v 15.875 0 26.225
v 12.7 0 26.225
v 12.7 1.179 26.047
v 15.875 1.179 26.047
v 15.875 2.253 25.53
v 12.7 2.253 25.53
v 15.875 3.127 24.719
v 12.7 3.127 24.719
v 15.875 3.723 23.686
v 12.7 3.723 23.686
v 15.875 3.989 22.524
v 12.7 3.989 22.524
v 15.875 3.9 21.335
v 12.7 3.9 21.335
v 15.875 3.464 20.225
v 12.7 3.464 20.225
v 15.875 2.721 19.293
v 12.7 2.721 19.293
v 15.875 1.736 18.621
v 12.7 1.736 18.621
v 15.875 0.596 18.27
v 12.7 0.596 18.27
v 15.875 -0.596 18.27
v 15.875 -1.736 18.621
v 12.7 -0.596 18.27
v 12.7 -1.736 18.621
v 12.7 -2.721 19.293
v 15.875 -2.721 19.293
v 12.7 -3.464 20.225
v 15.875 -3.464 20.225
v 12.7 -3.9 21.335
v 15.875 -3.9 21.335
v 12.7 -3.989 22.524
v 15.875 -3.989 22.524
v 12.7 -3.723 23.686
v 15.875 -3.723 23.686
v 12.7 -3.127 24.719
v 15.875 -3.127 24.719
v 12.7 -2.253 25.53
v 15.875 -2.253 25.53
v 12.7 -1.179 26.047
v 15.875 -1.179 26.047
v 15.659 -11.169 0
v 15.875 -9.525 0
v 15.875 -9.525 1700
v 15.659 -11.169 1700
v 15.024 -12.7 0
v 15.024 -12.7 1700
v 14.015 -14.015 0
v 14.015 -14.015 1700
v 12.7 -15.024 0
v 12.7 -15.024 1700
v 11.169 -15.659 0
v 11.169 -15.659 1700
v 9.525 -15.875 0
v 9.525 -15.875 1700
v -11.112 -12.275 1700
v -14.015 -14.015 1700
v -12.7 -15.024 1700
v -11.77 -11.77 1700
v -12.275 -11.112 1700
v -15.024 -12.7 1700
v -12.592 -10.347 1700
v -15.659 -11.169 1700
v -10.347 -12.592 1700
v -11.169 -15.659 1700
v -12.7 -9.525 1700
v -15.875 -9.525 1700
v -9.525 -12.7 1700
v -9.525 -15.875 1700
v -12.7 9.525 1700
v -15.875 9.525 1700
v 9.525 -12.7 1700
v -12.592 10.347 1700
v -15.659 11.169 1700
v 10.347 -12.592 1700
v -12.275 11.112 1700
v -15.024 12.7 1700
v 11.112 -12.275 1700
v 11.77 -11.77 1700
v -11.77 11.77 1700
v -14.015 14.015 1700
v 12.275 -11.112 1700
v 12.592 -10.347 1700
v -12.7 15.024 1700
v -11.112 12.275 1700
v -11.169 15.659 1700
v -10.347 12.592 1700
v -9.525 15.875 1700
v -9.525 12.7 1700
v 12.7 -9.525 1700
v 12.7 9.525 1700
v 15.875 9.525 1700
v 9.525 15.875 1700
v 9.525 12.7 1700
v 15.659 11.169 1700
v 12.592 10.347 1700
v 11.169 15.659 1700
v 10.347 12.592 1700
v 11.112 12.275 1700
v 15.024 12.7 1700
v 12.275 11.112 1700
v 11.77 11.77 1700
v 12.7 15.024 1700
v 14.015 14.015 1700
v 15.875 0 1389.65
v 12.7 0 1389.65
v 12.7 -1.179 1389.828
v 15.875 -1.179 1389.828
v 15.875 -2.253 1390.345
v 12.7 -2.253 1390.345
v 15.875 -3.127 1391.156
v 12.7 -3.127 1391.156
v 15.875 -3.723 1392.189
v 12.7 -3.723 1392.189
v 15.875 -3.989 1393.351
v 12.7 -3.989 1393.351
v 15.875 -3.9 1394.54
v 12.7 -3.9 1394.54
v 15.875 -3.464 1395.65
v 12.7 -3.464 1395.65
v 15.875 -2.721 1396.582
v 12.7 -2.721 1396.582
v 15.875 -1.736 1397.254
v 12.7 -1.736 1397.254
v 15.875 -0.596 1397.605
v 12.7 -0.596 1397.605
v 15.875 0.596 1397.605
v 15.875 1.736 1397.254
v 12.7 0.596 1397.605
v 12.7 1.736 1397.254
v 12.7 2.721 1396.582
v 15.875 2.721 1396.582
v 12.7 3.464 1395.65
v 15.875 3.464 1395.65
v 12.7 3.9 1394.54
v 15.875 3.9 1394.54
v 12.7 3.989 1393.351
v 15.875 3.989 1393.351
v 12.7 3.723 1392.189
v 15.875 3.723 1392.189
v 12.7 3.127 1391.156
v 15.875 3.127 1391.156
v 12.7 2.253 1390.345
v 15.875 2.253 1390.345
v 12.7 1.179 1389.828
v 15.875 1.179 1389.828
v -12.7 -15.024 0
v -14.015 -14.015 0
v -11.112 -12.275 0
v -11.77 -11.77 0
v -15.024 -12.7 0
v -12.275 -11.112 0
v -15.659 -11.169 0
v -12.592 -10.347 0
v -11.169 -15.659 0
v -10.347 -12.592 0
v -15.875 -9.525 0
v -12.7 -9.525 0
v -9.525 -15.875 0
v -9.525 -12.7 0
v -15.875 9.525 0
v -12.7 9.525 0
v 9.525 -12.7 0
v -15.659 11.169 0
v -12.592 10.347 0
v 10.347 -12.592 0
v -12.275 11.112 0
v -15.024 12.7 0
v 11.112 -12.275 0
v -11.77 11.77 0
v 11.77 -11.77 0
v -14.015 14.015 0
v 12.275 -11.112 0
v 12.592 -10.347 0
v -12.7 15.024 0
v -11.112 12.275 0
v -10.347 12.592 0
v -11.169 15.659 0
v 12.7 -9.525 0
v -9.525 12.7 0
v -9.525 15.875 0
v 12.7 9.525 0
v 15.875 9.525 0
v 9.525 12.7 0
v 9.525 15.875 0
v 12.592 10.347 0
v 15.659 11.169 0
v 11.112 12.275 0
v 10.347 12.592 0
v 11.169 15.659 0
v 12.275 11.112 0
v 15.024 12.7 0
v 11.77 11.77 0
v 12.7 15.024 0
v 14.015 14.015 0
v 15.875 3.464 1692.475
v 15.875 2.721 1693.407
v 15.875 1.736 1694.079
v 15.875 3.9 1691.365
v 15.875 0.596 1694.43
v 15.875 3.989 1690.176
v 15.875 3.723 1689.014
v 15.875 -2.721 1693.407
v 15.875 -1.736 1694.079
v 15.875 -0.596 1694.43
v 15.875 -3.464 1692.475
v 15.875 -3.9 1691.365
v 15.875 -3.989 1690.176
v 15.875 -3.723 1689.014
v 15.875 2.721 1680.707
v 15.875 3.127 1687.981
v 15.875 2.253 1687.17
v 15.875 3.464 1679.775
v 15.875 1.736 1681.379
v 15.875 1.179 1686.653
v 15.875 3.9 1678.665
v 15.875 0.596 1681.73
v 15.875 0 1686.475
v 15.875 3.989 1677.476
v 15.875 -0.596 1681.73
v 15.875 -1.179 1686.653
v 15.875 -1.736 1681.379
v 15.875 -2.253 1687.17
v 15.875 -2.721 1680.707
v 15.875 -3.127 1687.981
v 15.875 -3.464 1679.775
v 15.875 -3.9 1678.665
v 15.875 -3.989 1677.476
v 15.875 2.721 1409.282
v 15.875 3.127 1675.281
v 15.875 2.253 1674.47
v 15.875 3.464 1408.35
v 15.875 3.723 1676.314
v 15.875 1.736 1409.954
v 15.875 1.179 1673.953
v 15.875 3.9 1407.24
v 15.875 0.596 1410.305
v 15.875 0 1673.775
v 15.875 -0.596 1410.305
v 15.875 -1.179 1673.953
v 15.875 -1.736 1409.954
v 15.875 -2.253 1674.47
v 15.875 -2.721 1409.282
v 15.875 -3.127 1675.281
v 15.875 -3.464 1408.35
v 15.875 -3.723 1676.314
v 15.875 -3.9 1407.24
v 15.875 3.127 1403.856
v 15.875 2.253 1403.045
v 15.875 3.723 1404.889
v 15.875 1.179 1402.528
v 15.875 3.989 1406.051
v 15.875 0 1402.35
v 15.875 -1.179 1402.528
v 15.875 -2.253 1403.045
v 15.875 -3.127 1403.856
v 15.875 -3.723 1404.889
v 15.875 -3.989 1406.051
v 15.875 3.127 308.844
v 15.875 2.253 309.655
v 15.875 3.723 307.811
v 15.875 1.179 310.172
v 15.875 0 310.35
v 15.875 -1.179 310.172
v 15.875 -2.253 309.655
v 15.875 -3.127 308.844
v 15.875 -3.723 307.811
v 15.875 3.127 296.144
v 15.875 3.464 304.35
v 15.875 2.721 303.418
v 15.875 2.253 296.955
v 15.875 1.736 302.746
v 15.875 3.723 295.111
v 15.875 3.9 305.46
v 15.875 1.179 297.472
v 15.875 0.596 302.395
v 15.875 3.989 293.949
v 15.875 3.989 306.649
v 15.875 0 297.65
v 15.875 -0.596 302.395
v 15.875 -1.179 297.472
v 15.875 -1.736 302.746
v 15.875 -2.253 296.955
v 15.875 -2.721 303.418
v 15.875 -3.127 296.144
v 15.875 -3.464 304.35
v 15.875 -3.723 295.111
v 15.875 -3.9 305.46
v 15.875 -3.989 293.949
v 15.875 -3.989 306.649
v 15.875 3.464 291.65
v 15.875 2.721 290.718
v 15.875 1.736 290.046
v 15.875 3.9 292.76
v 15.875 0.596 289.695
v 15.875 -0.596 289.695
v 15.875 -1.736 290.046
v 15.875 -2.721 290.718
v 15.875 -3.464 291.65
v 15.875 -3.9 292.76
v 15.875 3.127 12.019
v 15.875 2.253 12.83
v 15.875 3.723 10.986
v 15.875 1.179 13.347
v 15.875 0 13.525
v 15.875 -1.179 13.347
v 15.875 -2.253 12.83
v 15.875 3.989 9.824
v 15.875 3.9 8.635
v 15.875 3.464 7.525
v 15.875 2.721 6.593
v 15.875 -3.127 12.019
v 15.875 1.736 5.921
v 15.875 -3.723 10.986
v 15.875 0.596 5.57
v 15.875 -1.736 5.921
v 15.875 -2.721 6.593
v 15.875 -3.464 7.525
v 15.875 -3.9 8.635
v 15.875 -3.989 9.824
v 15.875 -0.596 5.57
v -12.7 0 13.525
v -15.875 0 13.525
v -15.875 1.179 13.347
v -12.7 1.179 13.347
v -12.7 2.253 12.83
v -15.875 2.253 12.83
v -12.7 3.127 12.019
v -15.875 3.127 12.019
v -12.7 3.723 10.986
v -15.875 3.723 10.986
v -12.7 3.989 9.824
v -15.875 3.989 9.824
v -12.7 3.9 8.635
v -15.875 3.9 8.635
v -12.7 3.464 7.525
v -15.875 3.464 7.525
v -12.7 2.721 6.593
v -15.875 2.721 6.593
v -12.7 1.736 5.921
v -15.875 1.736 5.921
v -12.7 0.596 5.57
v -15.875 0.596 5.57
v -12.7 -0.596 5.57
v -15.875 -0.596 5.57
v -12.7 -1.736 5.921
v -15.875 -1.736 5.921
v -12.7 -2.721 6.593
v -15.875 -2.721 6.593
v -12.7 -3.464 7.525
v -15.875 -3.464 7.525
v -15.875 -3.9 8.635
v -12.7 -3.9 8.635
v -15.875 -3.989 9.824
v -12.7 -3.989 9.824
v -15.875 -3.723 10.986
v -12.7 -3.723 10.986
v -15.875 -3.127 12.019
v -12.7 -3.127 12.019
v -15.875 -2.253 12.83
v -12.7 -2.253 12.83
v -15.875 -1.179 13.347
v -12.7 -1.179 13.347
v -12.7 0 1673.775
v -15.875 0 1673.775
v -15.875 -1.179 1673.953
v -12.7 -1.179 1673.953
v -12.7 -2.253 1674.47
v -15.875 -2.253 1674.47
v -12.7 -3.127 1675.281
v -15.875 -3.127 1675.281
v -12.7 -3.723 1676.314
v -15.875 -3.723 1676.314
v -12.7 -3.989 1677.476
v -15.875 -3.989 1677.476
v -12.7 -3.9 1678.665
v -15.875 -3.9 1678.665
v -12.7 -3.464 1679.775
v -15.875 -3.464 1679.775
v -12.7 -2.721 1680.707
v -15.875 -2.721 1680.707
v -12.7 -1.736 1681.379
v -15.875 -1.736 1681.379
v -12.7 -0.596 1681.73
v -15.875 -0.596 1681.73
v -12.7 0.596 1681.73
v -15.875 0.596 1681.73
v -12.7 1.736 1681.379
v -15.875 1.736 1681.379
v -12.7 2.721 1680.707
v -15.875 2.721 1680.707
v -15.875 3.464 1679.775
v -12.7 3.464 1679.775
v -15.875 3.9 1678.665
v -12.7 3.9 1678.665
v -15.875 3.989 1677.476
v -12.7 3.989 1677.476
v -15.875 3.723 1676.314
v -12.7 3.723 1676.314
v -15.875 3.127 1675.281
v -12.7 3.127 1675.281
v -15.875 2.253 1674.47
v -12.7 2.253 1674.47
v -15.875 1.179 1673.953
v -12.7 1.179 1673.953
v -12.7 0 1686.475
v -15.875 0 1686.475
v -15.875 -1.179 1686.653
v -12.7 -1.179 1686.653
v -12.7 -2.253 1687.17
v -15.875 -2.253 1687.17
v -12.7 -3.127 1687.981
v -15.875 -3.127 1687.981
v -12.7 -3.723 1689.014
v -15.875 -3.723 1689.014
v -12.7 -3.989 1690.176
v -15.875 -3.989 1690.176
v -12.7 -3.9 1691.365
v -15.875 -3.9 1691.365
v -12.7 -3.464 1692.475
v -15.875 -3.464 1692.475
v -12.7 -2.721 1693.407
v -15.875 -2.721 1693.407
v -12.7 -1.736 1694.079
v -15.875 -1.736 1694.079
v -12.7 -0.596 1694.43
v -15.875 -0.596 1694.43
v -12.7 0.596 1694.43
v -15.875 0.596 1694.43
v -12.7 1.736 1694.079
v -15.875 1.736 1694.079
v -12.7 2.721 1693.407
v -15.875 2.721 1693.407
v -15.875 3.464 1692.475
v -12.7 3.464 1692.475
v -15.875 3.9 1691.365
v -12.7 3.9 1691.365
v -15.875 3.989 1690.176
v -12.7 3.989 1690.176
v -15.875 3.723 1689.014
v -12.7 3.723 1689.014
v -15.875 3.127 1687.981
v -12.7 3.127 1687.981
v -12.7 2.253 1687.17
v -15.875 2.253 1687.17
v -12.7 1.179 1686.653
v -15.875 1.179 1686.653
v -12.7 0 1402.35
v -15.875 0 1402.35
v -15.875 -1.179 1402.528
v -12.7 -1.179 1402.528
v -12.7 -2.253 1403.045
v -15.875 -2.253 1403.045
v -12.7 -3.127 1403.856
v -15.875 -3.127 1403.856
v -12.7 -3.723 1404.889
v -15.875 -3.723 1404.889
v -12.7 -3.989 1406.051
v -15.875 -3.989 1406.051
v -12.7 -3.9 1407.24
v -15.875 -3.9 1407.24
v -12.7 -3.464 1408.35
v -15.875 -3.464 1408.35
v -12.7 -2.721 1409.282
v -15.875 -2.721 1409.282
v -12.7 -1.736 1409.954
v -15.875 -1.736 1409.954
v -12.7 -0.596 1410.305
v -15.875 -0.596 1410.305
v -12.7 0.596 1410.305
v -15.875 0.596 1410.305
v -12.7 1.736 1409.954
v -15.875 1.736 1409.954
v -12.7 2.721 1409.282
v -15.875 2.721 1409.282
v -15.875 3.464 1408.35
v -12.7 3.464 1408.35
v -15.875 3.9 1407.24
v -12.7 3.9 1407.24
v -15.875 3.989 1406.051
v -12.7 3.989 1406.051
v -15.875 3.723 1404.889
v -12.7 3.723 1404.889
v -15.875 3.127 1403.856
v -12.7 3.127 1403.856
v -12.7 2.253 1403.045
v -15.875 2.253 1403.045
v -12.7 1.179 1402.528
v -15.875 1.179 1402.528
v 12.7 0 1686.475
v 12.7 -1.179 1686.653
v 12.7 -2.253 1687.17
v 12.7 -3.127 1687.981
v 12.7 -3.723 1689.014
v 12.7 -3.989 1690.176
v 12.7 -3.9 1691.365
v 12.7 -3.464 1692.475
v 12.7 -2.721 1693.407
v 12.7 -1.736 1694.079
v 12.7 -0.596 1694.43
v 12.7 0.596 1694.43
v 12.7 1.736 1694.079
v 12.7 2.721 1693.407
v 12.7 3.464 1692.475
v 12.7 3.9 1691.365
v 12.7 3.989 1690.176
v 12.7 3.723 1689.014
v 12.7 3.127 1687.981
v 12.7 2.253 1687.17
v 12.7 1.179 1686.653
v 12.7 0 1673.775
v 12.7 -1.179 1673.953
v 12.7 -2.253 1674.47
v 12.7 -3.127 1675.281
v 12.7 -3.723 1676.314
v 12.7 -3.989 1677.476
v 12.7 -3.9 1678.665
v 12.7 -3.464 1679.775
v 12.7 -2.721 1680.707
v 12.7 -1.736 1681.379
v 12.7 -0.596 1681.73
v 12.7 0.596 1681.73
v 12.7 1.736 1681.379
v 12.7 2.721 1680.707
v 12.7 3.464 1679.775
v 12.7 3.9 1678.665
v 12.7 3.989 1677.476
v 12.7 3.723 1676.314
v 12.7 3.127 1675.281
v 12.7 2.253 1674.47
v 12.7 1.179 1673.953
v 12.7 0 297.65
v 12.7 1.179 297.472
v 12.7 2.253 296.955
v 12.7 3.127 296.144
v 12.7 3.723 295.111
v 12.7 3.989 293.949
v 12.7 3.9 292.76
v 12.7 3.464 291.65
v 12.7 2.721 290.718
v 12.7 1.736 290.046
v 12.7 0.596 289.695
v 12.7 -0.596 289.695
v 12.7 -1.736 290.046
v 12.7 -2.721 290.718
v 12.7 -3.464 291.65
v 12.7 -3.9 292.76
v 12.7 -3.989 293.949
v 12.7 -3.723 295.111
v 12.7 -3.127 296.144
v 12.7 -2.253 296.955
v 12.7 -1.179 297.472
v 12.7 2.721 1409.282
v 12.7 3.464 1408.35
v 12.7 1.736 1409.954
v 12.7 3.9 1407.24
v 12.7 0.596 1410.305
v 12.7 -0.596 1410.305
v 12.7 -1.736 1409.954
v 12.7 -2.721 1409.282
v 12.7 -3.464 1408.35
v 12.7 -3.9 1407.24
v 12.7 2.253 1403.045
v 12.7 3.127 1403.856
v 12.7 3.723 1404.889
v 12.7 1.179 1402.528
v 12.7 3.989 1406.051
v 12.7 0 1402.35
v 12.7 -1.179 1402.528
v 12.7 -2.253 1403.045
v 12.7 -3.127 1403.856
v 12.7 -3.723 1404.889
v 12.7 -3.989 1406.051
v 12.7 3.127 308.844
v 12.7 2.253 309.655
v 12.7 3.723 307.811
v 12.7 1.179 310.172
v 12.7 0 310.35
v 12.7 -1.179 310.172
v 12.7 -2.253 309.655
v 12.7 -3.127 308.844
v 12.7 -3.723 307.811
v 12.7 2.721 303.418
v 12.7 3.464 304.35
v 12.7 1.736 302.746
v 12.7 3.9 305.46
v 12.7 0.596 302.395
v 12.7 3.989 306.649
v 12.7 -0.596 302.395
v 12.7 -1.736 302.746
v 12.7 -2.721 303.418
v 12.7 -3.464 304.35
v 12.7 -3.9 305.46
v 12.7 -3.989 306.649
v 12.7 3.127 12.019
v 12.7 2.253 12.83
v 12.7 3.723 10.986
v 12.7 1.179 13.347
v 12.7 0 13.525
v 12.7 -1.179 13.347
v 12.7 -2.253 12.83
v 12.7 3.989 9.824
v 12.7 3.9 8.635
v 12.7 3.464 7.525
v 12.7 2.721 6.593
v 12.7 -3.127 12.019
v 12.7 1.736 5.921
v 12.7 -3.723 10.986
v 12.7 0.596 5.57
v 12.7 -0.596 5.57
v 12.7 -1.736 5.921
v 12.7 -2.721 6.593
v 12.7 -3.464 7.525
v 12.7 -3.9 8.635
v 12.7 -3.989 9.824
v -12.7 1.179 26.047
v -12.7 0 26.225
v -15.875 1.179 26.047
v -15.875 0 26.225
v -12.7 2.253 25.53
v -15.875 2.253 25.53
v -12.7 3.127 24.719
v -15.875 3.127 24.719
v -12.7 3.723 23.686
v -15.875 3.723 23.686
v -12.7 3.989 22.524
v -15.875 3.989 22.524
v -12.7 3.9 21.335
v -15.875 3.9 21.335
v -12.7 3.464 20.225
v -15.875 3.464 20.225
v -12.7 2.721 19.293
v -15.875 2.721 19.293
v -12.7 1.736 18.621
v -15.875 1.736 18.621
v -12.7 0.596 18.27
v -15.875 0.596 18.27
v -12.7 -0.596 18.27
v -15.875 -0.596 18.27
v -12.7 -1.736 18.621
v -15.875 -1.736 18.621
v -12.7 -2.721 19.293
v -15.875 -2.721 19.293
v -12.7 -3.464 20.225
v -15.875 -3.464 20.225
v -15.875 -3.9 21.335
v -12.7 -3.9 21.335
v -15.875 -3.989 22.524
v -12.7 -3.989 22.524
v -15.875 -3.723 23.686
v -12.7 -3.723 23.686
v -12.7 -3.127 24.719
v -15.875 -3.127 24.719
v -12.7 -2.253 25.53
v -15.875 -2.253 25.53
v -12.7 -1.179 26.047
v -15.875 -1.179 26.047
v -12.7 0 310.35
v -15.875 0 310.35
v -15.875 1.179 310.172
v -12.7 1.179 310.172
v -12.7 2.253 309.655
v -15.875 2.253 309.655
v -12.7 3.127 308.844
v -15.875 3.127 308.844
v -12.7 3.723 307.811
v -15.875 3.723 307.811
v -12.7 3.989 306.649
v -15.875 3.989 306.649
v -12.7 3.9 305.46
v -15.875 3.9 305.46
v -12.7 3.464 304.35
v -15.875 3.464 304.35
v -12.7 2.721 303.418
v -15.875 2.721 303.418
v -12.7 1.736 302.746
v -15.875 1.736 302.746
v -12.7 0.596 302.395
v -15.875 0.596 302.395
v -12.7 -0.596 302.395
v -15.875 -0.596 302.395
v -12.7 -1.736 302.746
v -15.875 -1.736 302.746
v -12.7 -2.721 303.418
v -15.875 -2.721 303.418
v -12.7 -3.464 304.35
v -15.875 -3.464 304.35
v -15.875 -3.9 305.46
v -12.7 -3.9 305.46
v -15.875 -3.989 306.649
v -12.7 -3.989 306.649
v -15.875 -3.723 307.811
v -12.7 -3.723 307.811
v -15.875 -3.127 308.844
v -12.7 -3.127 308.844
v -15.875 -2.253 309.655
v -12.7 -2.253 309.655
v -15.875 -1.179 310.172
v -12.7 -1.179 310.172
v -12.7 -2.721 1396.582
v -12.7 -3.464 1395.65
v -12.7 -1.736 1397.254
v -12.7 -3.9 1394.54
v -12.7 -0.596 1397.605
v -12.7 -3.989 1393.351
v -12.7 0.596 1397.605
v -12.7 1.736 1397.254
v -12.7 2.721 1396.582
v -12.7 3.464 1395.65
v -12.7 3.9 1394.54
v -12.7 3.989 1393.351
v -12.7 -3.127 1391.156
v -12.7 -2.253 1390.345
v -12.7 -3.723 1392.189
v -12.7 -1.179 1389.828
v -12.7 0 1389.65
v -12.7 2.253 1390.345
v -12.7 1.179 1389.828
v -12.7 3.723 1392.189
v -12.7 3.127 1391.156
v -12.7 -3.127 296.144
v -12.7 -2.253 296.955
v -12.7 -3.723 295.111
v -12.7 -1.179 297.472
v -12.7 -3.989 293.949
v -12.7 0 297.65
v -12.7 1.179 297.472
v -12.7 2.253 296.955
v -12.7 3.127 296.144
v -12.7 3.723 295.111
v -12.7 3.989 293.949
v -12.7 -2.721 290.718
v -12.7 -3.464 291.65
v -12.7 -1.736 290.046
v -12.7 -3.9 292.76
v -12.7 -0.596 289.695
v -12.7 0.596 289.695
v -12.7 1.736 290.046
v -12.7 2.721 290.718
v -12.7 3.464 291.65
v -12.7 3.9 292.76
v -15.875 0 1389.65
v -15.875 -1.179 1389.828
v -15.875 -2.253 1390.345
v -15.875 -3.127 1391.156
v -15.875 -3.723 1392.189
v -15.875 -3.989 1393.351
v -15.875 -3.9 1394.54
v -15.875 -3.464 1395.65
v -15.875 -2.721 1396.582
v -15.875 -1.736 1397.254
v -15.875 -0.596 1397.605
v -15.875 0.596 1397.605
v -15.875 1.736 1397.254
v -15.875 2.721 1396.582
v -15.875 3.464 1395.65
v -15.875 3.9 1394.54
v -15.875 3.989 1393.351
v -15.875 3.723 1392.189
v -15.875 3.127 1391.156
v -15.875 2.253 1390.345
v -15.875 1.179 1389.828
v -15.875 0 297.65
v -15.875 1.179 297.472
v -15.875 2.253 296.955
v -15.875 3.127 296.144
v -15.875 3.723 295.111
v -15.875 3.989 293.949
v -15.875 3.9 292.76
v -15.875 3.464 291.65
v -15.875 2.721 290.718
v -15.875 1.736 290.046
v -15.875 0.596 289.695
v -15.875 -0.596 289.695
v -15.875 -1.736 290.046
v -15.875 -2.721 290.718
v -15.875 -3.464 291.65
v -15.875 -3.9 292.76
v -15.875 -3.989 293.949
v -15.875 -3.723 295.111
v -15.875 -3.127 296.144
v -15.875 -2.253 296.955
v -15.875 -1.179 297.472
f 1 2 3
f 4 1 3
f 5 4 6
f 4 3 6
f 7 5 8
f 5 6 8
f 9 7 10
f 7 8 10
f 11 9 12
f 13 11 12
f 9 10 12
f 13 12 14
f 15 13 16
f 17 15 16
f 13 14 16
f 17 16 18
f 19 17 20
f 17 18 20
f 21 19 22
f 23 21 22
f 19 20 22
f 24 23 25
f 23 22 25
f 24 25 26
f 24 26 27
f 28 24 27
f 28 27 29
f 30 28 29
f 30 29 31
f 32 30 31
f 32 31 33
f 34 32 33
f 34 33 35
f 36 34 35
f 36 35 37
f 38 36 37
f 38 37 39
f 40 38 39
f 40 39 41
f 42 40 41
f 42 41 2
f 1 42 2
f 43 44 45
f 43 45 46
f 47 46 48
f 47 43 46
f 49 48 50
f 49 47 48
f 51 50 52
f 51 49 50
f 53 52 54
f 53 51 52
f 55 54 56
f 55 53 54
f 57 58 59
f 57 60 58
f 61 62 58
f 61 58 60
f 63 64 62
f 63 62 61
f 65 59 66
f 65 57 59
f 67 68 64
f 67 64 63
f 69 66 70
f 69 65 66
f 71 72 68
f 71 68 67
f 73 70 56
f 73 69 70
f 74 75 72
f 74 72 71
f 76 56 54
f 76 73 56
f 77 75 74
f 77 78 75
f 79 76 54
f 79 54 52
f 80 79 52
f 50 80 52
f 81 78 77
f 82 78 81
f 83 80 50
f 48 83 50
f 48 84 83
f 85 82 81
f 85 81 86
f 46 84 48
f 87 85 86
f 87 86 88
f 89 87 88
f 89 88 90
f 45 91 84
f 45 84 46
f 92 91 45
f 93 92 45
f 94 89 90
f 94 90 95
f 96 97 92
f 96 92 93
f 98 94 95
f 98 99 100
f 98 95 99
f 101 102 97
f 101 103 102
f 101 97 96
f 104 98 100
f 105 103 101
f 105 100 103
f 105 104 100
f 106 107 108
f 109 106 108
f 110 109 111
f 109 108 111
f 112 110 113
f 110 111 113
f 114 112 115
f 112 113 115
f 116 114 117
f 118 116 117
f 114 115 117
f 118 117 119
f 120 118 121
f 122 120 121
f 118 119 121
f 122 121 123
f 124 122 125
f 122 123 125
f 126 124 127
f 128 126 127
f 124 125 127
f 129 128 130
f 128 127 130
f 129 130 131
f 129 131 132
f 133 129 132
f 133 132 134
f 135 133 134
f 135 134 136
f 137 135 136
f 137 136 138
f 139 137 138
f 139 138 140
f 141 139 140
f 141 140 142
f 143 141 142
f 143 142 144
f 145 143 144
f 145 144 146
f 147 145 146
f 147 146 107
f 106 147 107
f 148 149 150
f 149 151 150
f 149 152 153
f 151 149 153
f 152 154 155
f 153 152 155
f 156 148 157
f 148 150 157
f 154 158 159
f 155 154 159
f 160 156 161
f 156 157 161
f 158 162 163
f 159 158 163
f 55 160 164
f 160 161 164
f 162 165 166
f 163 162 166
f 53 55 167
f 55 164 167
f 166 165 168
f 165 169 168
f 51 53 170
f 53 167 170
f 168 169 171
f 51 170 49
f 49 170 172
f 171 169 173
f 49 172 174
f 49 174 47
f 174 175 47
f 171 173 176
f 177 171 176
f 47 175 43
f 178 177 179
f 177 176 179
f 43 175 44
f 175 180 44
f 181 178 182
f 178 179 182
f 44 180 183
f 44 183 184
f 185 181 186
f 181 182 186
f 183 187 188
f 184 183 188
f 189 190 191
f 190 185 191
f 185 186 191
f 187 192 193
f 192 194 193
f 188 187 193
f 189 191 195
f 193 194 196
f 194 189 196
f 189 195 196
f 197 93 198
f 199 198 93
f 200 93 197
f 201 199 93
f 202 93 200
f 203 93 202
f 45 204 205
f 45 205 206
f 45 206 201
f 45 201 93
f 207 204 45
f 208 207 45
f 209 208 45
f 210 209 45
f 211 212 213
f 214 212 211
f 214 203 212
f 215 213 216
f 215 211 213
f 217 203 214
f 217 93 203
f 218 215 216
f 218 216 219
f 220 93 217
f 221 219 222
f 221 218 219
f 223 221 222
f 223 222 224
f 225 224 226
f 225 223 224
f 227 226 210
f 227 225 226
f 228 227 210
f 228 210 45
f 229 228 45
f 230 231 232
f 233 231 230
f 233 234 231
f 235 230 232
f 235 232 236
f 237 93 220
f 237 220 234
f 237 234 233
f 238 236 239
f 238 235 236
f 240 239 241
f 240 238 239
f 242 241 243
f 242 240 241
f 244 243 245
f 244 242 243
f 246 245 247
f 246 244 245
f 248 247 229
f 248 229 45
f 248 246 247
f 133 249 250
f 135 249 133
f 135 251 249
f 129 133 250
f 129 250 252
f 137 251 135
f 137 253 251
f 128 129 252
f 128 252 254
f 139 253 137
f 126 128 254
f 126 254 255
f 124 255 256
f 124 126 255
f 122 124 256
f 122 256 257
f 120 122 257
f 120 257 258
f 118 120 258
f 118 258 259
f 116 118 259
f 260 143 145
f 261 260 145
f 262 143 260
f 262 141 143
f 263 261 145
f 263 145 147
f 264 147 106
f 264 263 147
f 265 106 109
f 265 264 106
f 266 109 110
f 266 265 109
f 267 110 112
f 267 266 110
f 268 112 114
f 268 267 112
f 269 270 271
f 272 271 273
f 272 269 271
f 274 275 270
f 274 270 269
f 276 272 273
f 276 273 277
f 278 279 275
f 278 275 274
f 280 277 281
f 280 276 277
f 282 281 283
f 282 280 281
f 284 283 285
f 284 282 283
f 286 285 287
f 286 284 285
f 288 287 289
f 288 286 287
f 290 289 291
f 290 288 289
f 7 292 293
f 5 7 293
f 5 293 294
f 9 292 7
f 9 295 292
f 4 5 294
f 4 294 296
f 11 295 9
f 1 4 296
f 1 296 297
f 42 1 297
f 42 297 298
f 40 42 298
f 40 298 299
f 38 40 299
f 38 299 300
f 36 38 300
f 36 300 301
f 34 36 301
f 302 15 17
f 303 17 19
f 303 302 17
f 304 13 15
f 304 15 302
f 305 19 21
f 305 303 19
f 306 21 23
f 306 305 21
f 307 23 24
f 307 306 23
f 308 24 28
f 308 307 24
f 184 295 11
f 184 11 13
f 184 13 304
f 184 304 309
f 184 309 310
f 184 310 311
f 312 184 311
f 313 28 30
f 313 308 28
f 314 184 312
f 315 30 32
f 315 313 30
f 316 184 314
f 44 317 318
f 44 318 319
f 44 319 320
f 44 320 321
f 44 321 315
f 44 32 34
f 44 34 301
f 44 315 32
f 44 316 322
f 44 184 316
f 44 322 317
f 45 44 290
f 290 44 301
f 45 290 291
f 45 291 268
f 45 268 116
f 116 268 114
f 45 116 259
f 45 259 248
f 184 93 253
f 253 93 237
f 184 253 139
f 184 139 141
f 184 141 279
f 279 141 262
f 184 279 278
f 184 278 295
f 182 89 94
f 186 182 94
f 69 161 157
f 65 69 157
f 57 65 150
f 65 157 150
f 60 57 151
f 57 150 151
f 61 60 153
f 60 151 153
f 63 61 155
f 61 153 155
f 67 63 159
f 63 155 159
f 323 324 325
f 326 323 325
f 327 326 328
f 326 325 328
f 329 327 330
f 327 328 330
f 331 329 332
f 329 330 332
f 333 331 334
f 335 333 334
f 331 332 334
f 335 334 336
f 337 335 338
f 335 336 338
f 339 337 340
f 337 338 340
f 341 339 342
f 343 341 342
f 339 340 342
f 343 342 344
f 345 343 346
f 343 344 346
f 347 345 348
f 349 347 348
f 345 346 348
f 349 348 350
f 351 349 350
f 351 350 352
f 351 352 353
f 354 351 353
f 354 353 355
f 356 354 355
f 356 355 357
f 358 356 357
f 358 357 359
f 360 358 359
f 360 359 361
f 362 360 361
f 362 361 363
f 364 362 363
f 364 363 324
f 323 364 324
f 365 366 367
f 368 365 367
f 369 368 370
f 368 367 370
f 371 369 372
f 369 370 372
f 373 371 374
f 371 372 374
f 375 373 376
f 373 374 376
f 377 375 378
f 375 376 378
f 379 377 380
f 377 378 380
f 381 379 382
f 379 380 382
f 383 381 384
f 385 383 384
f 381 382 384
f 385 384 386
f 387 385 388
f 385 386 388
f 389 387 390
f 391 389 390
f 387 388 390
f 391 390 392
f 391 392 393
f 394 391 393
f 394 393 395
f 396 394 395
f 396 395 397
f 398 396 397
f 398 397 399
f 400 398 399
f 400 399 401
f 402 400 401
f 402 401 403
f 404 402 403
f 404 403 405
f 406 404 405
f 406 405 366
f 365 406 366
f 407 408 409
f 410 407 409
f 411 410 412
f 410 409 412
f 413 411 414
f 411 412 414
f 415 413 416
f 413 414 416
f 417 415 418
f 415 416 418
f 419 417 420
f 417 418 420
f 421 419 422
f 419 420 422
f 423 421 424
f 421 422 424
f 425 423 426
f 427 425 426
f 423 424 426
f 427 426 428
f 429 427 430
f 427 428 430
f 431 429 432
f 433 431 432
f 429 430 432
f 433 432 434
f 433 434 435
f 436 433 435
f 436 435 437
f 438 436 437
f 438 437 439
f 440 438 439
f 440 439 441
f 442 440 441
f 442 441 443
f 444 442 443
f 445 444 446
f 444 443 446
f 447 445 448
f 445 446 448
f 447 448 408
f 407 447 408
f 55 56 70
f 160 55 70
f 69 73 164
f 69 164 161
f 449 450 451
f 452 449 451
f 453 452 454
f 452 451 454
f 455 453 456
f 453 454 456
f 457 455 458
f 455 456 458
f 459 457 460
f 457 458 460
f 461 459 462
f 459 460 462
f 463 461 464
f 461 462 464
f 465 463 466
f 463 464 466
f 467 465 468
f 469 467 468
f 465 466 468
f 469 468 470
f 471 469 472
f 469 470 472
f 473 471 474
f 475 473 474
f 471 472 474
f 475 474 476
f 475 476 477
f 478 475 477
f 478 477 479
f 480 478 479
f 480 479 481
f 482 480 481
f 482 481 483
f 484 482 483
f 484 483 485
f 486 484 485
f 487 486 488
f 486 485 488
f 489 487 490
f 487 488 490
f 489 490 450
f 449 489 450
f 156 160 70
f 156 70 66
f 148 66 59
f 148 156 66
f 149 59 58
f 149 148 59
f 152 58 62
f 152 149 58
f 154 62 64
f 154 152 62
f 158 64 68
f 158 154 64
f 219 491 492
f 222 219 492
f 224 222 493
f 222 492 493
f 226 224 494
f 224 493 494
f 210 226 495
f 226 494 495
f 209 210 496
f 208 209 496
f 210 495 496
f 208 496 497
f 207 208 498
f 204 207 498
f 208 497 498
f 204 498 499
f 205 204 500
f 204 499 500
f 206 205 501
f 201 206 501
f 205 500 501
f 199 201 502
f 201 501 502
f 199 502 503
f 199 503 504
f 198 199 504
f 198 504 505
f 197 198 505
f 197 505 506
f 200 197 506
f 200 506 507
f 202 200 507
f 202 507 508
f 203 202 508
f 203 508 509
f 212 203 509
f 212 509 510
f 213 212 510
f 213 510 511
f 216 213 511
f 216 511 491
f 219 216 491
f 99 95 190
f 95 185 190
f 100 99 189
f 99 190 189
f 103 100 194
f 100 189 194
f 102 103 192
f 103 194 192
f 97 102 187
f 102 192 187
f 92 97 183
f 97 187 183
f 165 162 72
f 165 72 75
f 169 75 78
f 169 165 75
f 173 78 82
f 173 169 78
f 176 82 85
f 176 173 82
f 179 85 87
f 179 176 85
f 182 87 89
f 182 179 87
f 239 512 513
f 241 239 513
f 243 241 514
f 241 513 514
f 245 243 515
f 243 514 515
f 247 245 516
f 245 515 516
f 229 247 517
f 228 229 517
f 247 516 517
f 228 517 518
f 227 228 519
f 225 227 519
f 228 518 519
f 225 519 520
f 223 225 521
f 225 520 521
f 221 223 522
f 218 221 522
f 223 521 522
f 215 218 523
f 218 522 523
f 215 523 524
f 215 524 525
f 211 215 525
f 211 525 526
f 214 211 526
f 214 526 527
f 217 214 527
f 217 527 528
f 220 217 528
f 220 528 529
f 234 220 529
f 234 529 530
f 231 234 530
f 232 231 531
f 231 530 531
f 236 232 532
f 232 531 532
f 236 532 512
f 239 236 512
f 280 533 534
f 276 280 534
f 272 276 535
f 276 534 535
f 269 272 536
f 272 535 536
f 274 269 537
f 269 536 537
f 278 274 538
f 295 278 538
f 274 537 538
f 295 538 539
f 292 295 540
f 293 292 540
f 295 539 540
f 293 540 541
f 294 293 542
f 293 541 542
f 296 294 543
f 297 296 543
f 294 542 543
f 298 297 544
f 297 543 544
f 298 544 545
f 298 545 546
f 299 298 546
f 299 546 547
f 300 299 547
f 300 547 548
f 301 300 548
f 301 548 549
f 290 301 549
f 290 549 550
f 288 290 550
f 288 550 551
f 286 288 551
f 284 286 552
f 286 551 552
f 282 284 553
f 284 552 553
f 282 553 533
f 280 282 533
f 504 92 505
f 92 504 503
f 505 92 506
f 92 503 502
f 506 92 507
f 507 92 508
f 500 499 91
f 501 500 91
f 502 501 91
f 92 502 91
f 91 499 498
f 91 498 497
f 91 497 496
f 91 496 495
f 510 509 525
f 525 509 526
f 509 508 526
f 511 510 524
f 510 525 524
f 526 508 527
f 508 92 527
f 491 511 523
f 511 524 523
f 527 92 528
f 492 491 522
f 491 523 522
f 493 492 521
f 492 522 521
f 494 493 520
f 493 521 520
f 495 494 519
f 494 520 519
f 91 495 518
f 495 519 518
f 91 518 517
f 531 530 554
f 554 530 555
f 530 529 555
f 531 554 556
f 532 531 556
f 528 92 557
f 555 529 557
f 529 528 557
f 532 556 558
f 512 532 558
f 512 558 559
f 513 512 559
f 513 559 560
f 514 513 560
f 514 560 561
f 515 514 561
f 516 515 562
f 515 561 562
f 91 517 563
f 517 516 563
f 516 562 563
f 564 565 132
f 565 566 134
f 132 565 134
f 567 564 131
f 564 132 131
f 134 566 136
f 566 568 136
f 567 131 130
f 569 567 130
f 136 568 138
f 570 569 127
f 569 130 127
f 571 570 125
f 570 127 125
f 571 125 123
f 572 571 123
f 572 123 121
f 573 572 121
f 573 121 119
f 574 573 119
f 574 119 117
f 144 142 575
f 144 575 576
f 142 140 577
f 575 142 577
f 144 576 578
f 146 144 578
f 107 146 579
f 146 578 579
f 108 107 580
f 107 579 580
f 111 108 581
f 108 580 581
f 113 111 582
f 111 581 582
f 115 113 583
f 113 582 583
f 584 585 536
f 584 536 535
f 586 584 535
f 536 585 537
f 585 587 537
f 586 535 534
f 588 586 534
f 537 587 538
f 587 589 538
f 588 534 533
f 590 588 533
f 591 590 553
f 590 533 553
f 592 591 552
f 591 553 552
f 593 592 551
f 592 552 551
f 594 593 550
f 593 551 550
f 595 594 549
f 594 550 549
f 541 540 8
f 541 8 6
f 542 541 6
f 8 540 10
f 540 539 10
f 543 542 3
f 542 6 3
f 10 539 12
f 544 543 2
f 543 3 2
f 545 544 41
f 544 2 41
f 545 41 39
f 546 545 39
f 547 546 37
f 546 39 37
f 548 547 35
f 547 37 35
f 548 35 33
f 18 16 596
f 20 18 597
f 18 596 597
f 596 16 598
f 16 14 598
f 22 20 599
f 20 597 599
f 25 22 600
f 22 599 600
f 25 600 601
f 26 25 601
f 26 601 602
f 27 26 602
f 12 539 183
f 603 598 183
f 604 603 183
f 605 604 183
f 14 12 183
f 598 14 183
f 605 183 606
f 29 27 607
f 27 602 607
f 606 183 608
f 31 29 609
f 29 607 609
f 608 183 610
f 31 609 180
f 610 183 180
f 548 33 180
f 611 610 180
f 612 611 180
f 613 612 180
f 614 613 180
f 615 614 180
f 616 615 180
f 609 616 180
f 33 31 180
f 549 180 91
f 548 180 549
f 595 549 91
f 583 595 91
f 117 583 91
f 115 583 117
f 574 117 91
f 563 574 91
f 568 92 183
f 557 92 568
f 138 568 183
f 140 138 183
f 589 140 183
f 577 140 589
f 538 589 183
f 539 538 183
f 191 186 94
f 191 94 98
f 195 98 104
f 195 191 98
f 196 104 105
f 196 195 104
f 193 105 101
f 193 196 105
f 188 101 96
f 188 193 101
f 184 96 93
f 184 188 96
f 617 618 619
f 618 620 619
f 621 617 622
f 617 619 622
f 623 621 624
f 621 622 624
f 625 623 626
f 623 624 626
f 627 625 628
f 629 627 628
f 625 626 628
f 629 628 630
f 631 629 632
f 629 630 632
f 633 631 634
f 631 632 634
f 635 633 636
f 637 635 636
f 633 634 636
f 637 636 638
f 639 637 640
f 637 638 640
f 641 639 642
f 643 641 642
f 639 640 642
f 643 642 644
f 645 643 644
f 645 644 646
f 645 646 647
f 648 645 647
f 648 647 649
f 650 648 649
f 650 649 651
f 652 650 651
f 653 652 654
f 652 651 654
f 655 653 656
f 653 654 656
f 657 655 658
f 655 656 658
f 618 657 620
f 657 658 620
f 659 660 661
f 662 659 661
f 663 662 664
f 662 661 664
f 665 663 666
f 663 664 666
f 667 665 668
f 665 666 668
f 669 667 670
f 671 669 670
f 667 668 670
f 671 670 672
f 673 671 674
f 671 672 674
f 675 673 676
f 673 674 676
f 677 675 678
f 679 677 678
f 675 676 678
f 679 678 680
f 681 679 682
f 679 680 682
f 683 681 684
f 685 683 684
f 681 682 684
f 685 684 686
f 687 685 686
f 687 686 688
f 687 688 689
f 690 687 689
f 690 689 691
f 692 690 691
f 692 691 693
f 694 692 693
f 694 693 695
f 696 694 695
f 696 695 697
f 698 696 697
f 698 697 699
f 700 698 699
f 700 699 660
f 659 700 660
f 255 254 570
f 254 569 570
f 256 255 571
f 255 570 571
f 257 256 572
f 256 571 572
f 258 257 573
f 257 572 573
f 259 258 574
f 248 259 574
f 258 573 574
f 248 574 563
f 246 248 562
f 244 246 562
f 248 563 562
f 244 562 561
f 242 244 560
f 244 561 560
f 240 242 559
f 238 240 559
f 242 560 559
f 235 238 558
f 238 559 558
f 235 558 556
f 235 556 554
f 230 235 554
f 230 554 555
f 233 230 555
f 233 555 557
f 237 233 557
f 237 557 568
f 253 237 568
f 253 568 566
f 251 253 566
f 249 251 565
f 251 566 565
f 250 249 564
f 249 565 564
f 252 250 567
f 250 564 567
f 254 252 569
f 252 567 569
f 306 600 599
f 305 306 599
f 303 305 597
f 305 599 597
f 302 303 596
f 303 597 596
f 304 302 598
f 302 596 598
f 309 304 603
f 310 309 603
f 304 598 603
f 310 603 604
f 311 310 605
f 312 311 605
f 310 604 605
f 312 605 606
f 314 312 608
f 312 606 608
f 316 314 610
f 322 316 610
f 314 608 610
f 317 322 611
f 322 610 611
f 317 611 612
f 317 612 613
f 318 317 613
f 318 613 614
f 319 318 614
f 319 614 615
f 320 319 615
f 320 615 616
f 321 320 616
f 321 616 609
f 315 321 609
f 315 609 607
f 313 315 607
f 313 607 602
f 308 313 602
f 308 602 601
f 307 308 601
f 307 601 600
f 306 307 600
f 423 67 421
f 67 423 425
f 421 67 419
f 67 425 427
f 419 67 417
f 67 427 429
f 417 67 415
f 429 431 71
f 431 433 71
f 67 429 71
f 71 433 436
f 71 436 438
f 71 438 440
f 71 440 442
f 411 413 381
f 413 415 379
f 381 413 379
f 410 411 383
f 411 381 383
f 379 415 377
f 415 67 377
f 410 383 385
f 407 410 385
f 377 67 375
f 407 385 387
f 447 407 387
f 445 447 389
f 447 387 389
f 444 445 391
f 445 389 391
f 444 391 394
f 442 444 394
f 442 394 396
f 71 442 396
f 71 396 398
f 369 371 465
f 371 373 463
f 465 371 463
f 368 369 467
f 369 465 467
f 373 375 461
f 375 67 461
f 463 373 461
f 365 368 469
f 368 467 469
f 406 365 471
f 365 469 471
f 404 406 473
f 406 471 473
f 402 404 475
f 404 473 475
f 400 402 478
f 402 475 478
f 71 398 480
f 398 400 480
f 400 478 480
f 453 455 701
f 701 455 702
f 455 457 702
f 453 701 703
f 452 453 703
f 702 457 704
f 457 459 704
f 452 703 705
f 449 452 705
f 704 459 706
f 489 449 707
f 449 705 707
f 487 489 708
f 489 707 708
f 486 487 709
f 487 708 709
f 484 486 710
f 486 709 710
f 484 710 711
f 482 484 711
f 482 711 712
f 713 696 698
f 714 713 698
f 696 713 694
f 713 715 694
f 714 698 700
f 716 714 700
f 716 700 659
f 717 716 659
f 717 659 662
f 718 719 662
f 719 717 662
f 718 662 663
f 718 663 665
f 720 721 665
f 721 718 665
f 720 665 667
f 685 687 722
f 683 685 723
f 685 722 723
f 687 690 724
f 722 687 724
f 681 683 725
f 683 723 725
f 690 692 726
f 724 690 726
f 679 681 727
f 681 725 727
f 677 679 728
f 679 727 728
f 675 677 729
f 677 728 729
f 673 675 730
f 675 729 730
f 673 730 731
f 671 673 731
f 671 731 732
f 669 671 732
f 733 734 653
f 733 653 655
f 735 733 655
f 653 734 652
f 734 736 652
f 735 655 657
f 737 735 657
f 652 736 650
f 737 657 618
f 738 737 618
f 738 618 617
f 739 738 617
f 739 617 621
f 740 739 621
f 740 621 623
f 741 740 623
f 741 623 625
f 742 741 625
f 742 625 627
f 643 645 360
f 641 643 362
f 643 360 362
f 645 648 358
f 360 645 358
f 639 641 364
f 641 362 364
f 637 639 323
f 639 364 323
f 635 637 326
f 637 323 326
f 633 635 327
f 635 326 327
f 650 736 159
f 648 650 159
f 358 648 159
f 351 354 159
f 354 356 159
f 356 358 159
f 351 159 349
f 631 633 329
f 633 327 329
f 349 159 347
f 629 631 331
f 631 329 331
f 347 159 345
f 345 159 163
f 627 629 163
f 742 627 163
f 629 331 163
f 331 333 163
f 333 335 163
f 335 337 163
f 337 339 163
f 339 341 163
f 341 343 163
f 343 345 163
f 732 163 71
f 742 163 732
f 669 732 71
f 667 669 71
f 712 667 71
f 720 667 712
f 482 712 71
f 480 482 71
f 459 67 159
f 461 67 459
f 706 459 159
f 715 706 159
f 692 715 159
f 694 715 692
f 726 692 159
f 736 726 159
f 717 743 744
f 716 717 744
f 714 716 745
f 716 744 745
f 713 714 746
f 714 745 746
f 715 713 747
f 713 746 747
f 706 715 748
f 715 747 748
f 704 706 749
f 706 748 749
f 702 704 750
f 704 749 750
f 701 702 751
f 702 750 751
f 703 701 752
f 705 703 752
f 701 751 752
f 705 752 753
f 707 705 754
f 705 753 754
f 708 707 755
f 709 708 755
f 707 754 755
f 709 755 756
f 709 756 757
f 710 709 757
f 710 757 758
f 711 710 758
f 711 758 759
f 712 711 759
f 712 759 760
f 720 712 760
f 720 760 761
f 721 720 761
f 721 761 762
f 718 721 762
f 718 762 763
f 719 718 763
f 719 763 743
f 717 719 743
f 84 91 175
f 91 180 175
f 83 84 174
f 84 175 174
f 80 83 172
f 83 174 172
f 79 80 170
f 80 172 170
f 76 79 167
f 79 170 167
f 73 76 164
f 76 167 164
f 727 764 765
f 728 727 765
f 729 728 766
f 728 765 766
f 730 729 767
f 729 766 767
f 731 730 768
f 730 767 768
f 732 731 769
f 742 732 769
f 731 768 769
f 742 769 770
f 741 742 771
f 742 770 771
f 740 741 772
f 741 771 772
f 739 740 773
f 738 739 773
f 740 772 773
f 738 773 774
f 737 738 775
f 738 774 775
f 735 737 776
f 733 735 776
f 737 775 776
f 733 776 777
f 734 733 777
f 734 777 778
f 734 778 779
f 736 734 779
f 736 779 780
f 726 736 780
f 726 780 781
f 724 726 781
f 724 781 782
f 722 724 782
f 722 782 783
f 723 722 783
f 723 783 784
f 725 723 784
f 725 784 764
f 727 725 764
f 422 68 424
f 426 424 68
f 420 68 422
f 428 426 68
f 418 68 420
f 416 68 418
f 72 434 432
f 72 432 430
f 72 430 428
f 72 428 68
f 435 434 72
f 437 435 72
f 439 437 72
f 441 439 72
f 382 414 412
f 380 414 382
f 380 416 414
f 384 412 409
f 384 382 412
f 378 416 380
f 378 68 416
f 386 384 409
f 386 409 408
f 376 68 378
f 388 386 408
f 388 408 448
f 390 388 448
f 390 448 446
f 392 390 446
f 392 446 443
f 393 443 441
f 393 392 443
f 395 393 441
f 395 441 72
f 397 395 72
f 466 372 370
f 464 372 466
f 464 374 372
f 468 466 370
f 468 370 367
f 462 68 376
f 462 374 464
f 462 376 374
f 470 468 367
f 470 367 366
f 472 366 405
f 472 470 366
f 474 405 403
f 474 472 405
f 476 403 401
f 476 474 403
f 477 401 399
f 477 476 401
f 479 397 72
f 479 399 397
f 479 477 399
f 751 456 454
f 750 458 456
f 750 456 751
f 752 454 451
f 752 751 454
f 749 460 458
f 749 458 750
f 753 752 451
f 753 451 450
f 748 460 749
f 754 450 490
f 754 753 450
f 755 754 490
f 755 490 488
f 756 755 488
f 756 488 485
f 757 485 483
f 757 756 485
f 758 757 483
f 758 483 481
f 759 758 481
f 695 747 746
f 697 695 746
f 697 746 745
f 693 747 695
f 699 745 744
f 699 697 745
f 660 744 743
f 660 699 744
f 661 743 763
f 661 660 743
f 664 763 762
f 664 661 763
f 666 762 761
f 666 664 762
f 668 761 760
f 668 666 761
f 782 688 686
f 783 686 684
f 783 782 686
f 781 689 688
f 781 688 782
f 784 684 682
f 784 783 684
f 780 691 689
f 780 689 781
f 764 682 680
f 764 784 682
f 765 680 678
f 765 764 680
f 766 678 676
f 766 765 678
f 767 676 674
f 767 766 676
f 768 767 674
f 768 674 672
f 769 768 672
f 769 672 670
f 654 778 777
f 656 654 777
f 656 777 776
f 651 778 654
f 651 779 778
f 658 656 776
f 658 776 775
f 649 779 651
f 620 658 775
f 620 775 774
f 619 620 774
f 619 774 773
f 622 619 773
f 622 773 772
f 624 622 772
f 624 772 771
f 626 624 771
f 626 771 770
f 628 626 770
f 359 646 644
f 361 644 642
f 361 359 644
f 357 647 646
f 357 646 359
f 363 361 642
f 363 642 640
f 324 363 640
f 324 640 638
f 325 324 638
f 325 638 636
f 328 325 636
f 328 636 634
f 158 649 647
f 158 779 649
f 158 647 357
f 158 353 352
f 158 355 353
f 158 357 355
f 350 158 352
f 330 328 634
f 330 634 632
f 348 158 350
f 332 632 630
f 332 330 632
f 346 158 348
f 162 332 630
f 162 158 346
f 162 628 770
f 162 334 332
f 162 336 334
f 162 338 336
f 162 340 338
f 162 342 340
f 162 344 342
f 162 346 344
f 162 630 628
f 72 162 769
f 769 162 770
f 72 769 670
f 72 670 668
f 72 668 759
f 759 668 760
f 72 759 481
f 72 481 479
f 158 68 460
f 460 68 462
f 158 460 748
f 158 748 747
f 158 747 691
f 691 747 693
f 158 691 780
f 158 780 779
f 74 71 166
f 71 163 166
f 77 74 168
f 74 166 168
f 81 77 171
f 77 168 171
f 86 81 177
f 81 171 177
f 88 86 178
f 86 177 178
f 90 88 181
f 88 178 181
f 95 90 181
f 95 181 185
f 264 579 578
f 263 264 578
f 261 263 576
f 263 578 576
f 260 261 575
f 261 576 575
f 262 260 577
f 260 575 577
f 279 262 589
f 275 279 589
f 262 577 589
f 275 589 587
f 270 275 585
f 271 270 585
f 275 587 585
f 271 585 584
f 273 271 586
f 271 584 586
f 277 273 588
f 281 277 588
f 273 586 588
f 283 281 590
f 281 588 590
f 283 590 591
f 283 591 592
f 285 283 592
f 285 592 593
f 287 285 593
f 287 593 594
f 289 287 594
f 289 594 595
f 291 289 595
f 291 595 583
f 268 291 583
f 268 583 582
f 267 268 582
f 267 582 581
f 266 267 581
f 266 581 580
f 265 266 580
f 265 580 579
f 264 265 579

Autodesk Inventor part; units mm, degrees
ref_plane "YZ Plane" through (0, 0, 0) normal (1, 0, 0) x (0, 1, 0)
ref_plane "Start Plane" through (0, 0, 0) normal (0, 0, 1) x (1, 0, 0)
ref_plane "End Plane" through (0, 0, 1700) normal (0, 0, 1) x (1, 0, 0)
sketch "Sketch" plane through (0, 0, 0) normal (0, 0, 1) x (1, 0, 0)
  line L0 (-15.875, -9.525) -> (-15.875, 9.525)
  line L1 (-9.525, 15.875) -> (9.525, 15.875)
  line L2 (15.875, 9.525) -> (15.875, -9.525)
  line L3 (9.525, -15.875) -> (-9.525, -15.875)
  arc A0 (-15.875, -9.525) -> (-9.525, -15.875) centre (-9.525, -9.525) ccw
  arc A1 (-9.525, 15.875) -> (-15.875, 9.525) centre (-9.525, 9.525) ccw
  arc A2 (15.875, 9.525) -> (9.525, 15.875) centre (9.525, 9.525) ccw
  arc A3 (9.525, -15.875) -> (15.875, -9.525) centre (9.525, -9.525) ccw
  arc A4 (-9.525, 12.7) -> (-12.7, 9.525) centre (-9.525, 9.525) ccw
  line L4 (-9.525, 12.7) -> (9.525, 12.7)
  arc A5 (12.7, 9.525) -> (9.525, 12.7) centre (9.525, 9.525) ccw
  line L5 (12.7, 9.525) -> (12.7, -9.525)
  arc A6 (9.525, -12.7) -> (12.7, -9.525) centre (9.525, -9.525) ccw
  line L6 (9.525, -12.7) -> (-9.525, -12.7)
  arc A7 (-12.7, -9.525) -> (-9.525, -12.7) centre (-9.525, -9.525) ccw
  line L7 (-12.7, -9.525) -> (-12.7, 9.525)
  line L8 (0, 24.0662) -> (0, -24.0662) construction
  line L9 (-24.0662, 0) -> (24.0662, 0) construction
  dimension "d10" = 31.75
  dimension "d11" = 31.75
  dimension "d12" = 3.175
  dimension "d15" = 15.875
  dimension "d16" = 15.875
  dimension "d17" = 6.35
extrude "Body" add sketch "Sketch" along normal up to surface (1700 mm away) from surface at 0
sketch "Sketch3" plane through (0, 0, 0) normal (0, 0, 1) x (1, 0, 0)
  line L0 (0, 0) -> (10, 0)
ref_plane "Work Plane3" through (0, 0, 0) normal (0, -1, 0) x (1, 0, 0)
sketch "Sketch5" plane through (-15.875, 9.525, 0) normal (-1, 0, 0) x (0, 0, 1)
  line L0 (309.525, 3.175) -> (290.475, 3.175) projected
  arc A0 (312.7, 0) -> (309.525, 3.175) centre (309.525, 0) ccw projected
  line L1 (312.7, -19.05) -> (312.7, 0) projected
  arc A1 (309.525, -22.225) -> (312.7, -19.05) centre (309.525, -19.05) ccw projected
  line L2 (290.475, -22.225) -> (309.525, -22.225) projected
  arc A2 (287.3, -19.05) -> (290.475, -22.225) centre (290.475, -19.05) ccw projected
  line L3 (287.3, 0) -> (287.3, -19.05) projected
  arc A3 (290.475, 3.175) -> (287.3, 0) centre (290.475, 0) ccw projected
  line L4 (284.125, -19.05) -> (284.125, 0) projected
  arc A4 (284.125, -19.05) -> (290.475, -25.4) centre (290.475, -19.05) ccw projected
  line L5 (309.525, -25.4) -> (290.475, -25.4) projected
  arc A5 (309.525, -25.4) -> (315.875, -19.05) centre (309.525, -19.05) ccw projected
  line L6 (315.875, 0) -> (315.875, -19.05) projected
  arc A6 (315.875, 0) -> (309.525, 6.35) centre (309.525, 0) ccw projected
  line L7 (290.475, 6.35) -> (309.525, 6.35) projected
  arc A7 (290.475, 6.35) -> (284.125, 0) centre (290.475, 0) ccw projected
  circle A8 centre (293.65, -9.525) radius 4
  line L8 (300, -22.225) -> (300, 3.175)
  line L9 (293.65, -3.1741) -> (299.15, -6.3496)
  line L10 (299.15, -6.3496) -> (299.15, -12.7004)
  line L11 (299.15, -12.7004) -> (293.65, -15.8759)
  line L12 (293.65, -15.8759) -> (288.15, -12.7004)
  line L13 (288.15, -12.7004) -> (288.15, -6.3496)
  line L14 (288.15, -6.3496) -> (293.65, -3.1741)
  circle A9 centre (306.35, -9.525) radius 4
  line L15 (306.35, -3.1741) -> (300.85, -6.3496)
  line L16 (300.85, -6.3496) -> (300.85, -12.7004)
  line L17 (300.85, -12.7004) -> (306.35, -15.8759)
  line L18 (306.35, -15.8759) -> (311.85, -12.7004)
  line L19 (311.85, -12.7004) -> (311.85, -6.3496)
  line L20 (311.85, -6.3496) -> (306.35, -3.1741)
  line L21 (6.35, 3.175) -> (25.4, 3.175) projected
  arc A10 (28.575, 0) -> (25.4, 3.175) centre (25.4, 0) ccw projected
  line L22 (28.575, 0) -> (28.575, -19.05) projected
  arc A11 (25.4, -22.225) -> (28.575, -19.05) centre (25.4, -19.05) ccw projected
  line L23 (25.4, -22.225) -> (6.35, -22.225) projected
  arc A12 (3.175, -19.05) -> (6.35, -22.225) centre (6.35, -19.05) ccw projected
  line L24 (3.175, -19.05) -> (3.175, 0) projected
  arc A13 (6.35, 3.175) -> (3.175, 0) centre (6.35, 0) ccw projected
  line L25 (31.75, -19.05) -> (31.75, 0) projected
  arc A14 (31.75, 0) -> (25.4, 6.35) centre (25.4, 0) ccw projected
  line L26 (25.4, 6.35) -> (6.35, 6.35) projected
  arc A15 (6.35, 6.35) -> (0, 0) centre (6.35, 0) ccw projected
  line L27 (0, 0) -> (0, -19.05) projected
  arc A16 (0, -19.05) -> (6.35, -25.4) centre (6.35, -19.05) ccw projected
  line L28 (6.35, -25.4) -> (25.4, -25.4) projected
  arc A17 (25.4, -25.4) -> (31.75, -19.05) centre (25.4, -19.05) ccw projected
  circle A18 centre (9.525, -9.525) radius 4
  line L29 (15.875, -22.225) -> (15.875, 3.175)
  line L30 (9.525, -3.1741) -> (15.025, -6.3496)
  line L31 (15.025, -6.3496) -> (15.025, -12.7004)
  line L32 (15.025, -12.7004) -> (9.525, -15.8759)
  line L33 (9.525, -15.8759) -> (4.025, -12.7004)
  line L34 (4.025, -12.7004) -> (4.025, -6.3496)
  line L35 (4.025, -6.3496) -> (9.525, -3.1741)
  line L36 (27.725, -12.7004) -> (27.725, -6.3496)
  line L37 (16.725, -6.3496) -> (16.725, -12.7004)
  line L38 (16.725, -12.7004) -> (22.225, -15.8759)
  line L39 (22.225, -15.8759) -> (27.725, -12.7004)
  circle A19 centre (22.225, -9.525) radius 4
  line L40 (27.725, -6.3496) -> (22.225, -3.1741)
  line L41 (22.225, -3.1741) -> (16.725, -6.3496)
  point P0 (0, -9.525)
  point P1 (300, -9.525)
  point P2 (299.15, -9.525)
  point P3 (300.85, -9.525)
  point P4 (15.875, -9.525)
  point P5 (15.025, -9.525)
  point P6 (16.725, -9.525)
  dimension "d20" = 8
  dimension "d22" = 11
  dimension "d23" = 6.35
  dimension "d26" = 8
  dimension "d27" = 11
  dimension "d28" = 6.35
extrude "Extrusion2" cut sketch "Sketch5" against normal through all contours A8 | A9 | A18 | A19
ref_plane "Work Plane4" through (0, 0, 850) normal (0, 0, -1) x (-1, 0, 0)
mirror "Mirror1" about plane through (0, 0, 850) normal (0, 0, -1) of "Extrusion2"
sketch "Sketch4" plane through (0, 0, 0) normal (0, -1, 0) x (1, 0, 0)
  line L0 (-2, 0) -> (12, 0) projected
  line L1 (-2, 1700) -> (12, 1700) projected
  dimension "d19" = 1700
equation "\"d10\" = G_H"
equation "\"d11\" = G_W"
equation "\"d12\" = G_T"
equation "\"d15\" = 0.5 * d10"
equation "\"d16\" = 0.5 * d11"
equation "\"d17\" = G_IR"
equation "\"d3\" = G_L"
equation "\"G_W\" = 31.75"
equation "\"G_H\" = 31.75"
equation "\"G_T\" = 3.175"
equation "\"G_IR\" = 6.35"
equation "\"G_L\" = d19"
equation "\"G_OFFSET_START\" = 0"
equation "\"G_OFFSET_END\" = 0"
equation "\"d14\" = G_OFFSET_END + B_L"
equation "\"B_L\" = 1700"
properties part number "AISC HSS - (1 1/4x1 1/4x1/8) - 66.929" material "Steel, Mild"
